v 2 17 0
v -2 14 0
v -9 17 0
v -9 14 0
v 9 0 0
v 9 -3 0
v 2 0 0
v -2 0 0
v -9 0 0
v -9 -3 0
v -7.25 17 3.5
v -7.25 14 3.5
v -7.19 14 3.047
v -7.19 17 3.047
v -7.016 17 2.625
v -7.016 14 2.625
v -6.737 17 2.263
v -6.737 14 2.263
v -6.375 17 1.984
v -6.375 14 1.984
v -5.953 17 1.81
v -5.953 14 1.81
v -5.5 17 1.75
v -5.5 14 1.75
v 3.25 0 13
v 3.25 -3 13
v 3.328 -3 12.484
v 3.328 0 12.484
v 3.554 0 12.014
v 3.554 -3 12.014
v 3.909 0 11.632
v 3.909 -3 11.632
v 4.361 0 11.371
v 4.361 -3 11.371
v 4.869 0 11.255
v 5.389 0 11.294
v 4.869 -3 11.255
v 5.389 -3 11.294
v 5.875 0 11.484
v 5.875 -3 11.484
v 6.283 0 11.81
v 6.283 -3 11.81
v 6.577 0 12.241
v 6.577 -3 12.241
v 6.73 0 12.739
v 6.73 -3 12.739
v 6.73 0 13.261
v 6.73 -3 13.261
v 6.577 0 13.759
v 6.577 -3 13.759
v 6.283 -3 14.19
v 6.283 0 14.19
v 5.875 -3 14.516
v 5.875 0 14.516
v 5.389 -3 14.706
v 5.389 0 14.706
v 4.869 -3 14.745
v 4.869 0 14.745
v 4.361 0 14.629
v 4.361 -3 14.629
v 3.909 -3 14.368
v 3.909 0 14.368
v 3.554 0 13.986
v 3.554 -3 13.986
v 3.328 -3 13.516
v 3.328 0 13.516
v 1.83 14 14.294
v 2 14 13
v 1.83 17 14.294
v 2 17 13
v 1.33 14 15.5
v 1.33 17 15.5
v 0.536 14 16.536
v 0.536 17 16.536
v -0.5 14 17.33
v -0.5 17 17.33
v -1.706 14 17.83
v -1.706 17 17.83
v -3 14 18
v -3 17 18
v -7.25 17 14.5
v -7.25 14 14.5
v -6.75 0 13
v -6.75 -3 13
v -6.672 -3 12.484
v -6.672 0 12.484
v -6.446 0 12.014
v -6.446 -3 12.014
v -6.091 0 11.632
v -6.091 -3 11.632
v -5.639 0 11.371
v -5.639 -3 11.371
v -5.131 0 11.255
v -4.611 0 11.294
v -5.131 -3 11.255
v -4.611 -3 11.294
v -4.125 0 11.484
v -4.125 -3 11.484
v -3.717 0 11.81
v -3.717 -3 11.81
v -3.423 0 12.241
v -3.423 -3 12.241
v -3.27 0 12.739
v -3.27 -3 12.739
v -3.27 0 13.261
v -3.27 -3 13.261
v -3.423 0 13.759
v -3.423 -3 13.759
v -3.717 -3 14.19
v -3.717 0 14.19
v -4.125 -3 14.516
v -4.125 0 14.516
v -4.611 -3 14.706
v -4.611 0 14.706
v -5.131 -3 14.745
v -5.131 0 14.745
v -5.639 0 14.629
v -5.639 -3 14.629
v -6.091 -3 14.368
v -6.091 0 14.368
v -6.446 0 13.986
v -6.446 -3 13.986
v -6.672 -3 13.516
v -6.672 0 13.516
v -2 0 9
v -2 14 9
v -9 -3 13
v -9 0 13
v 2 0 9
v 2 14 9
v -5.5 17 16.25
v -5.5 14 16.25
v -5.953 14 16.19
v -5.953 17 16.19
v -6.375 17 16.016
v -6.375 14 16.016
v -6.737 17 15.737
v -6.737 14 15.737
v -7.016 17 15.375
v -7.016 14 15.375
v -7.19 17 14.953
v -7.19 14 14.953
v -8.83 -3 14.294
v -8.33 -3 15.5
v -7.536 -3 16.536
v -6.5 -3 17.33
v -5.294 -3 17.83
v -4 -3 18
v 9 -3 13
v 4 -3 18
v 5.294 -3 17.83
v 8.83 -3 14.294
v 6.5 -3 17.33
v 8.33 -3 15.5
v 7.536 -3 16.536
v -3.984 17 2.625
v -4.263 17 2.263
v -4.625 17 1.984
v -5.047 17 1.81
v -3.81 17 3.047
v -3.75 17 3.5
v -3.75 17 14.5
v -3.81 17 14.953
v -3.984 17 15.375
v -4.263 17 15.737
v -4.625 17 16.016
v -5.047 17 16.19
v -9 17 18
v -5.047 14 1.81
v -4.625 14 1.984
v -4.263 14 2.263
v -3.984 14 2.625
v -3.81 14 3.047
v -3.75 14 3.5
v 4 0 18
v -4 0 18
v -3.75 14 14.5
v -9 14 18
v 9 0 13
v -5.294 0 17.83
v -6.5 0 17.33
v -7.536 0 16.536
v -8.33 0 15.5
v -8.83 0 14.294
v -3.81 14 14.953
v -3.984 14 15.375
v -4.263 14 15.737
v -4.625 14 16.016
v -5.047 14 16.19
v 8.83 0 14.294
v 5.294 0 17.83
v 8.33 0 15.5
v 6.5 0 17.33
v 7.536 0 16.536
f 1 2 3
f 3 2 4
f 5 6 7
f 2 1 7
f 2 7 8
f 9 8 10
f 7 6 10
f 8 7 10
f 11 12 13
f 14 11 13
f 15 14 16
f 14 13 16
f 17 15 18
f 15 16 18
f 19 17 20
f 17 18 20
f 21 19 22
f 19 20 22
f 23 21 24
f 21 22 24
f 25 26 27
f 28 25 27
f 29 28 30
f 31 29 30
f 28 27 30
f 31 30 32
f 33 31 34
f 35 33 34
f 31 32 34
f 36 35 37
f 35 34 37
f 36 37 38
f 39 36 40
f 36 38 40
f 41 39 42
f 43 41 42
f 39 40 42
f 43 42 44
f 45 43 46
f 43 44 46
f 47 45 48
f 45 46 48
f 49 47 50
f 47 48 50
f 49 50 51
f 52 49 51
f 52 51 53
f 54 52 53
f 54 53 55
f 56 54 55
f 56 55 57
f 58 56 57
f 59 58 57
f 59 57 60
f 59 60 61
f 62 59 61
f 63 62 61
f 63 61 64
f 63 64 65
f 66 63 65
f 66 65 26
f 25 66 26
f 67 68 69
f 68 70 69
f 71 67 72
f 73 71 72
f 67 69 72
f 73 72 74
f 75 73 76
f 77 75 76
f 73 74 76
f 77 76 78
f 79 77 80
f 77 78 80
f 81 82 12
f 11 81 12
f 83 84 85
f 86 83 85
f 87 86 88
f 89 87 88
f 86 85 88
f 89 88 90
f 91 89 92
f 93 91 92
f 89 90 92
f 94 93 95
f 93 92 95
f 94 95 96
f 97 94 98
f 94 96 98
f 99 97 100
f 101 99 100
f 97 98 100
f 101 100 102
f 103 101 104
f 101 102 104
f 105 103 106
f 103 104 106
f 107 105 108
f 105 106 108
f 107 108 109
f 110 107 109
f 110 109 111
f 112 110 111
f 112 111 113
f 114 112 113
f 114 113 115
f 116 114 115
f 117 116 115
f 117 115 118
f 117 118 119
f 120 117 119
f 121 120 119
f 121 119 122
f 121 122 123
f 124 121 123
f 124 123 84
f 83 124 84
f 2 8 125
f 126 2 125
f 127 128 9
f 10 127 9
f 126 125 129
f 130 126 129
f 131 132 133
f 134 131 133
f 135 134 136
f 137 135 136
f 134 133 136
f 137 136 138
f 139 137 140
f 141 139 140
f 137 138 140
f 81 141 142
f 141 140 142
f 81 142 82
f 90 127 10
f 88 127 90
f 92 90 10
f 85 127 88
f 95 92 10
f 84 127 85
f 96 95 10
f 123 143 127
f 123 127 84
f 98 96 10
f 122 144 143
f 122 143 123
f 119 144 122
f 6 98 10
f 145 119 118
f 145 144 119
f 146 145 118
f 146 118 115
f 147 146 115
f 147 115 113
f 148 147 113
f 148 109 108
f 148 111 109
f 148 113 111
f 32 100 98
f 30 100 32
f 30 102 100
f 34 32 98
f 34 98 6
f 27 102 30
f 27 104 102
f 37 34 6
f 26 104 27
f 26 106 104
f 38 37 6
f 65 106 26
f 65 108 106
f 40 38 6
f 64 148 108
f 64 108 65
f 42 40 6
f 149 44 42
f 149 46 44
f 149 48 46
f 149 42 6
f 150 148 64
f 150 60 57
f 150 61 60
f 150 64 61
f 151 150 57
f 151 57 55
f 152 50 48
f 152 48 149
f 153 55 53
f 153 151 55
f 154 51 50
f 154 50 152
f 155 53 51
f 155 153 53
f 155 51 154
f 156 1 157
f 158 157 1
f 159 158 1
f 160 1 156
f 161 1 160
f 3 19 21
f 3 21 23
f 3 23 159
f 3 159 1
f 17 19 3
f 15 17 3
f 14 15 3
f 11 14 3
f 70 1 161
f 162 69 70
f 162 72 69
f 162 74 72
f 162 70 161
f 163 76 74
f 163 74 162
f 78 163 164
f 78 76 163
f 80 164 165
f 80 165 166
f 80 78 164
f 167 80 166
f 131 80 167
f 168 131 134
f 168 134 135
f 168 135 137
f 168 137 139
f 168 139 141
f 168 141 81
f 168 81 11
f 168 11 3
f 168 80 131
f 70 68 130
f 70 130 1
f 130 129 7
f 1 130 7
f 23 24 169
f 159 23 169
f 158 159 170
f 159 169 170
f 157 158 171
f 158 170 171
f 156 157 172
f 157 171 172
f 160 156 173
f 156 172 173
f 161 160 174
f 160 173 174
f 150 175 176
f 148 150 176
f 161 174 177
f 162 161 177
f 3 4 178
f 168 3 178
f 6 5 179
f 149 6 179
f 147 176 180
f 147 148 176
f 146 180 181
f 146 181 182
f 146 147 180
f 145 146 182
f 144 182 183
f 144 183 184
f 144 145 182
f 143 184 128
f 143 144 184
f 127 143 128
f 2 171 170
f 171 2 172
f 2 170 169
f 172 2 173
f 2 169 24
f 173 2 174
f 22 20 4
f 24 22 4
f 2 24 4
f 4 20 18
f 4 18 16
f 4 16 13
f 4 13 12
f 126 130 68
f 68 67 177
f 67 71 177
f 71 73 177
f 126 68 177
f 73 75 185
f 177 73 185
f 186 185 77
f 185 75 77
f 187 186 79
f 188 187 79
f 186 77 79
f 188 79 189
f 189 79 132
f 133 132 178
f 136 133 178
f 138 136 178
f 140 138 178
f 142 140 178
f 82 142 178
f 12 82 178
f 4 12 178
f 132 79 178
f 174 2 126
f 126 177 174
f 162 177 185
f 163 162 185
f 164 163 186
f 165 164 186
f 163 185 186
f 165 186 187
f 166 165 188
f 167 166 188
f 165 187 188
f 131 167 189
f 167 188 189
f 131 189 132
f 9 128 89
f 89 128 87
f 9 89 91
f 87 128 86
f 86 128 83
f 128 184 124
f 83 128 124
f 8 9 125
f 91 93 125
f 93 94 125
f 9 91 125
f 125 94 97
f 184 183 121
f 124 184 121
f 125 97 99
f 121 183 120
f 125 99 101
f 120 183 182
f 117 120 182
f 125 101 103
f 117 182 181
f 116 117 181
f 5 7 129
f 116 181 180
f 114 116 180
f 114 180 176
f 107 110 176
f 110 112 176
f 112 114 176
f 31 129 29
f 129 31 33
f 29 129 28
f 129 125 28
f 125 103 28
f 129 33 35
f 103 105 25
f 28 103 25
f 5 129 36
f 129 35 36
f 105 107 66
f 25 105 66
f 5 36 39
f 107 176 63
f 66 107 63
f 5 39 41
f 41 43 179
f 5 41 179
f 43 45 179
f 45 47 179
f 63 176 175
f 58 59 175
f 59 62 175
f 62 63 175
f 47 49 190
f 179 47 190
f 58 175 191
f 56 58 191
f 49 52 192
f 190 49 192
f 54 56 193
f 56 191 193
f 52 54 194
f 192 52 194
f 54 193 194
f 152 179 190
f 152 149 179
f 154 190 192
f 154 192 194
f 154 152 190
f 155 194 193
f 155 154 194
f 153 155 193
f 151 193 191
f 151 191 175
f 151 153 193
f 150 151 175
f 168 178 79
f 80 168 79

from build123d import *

# Parameters (mm, degrees)
F1_DEPTH = 3
F2_D     = 3.5
F3_W     = 4
F3_H     = 9
F4_DEPTH = 14
F5_W     = 4
F5_H     = 9
F6_DEPTH = 3
F7_R     = 5


with BuildPart() as f1:
    # F0 (on Front) → F1 (new body)
    with BuildSketch(Plane.XZ):
        Polygon((-9, 9), (-9, 0), (9, 0), (9, 9), (9, 18), (-9, 18), align=None)
    extrude(amount=F1_DEPTH)

    # F2 (through all)
    with Locations(Plane(origin=(0, 0, 0), x_dir=(1, 0, 0), z_dir=(0, 1, 0))):
        with Locations((-5, -13), (5, -13)):
            Hole(F2_D / 2)

    # F3 (on face) → F4 (join)
    with BuildSketch(Plane.XZ):
        with Locations((0, 4.5)):
            Rectangle(F3_W, F3_H)
    extrude(amount=-F4_DEPTH)

    # F5 (on face) → F6 (join)
    with BuildSketch(Plane(origin=(0, 14, 0), x_dir=(-1, 0, 0), z_dir=(0, 1, 0))):
        Polygon((9, 0), (9, 18), (-2, 18), (-2, 9), (2, 9), (2, 0), align=None)
        with BuildLine():
            ThreePointArc((5.5, 16.25), (6.7374368671, 15.7374368671), (7.25, 14.5))
            Line((7.25, 14.5), (7.25, 3.5))
            ThreePointArc((7.25, 3.5), (6.7374368671, 2.2625631329), (5.5, 1.75))
            ThreePointArc((5.5, 1.75), (4.2625631329, 2.2625631329), (3.75, 3.5))
            Line((3.75, 3.5), (3.75, 14.5))
            ThreePointArc((3.75, 14.5), (4.2625631329, 15.7374368671), (5.5, 16.25))
        make_face(mode=Mode.SUBTRACT)
        with Locations((0, 4.5)):
            Rectangle(F5_W, F5_H)
    extrude(amount=F6_DEPTH)

    # F7
    f7_edges = [f1.edges().sort_by_distance(p)[0] for p in [
        (9, -1.5, 18),
        (-9, -1.5, 18),
        (2, 15.5, 18),
    ]]
    fillet(f7_edges, radius=F7_R)


solid = f1.part
